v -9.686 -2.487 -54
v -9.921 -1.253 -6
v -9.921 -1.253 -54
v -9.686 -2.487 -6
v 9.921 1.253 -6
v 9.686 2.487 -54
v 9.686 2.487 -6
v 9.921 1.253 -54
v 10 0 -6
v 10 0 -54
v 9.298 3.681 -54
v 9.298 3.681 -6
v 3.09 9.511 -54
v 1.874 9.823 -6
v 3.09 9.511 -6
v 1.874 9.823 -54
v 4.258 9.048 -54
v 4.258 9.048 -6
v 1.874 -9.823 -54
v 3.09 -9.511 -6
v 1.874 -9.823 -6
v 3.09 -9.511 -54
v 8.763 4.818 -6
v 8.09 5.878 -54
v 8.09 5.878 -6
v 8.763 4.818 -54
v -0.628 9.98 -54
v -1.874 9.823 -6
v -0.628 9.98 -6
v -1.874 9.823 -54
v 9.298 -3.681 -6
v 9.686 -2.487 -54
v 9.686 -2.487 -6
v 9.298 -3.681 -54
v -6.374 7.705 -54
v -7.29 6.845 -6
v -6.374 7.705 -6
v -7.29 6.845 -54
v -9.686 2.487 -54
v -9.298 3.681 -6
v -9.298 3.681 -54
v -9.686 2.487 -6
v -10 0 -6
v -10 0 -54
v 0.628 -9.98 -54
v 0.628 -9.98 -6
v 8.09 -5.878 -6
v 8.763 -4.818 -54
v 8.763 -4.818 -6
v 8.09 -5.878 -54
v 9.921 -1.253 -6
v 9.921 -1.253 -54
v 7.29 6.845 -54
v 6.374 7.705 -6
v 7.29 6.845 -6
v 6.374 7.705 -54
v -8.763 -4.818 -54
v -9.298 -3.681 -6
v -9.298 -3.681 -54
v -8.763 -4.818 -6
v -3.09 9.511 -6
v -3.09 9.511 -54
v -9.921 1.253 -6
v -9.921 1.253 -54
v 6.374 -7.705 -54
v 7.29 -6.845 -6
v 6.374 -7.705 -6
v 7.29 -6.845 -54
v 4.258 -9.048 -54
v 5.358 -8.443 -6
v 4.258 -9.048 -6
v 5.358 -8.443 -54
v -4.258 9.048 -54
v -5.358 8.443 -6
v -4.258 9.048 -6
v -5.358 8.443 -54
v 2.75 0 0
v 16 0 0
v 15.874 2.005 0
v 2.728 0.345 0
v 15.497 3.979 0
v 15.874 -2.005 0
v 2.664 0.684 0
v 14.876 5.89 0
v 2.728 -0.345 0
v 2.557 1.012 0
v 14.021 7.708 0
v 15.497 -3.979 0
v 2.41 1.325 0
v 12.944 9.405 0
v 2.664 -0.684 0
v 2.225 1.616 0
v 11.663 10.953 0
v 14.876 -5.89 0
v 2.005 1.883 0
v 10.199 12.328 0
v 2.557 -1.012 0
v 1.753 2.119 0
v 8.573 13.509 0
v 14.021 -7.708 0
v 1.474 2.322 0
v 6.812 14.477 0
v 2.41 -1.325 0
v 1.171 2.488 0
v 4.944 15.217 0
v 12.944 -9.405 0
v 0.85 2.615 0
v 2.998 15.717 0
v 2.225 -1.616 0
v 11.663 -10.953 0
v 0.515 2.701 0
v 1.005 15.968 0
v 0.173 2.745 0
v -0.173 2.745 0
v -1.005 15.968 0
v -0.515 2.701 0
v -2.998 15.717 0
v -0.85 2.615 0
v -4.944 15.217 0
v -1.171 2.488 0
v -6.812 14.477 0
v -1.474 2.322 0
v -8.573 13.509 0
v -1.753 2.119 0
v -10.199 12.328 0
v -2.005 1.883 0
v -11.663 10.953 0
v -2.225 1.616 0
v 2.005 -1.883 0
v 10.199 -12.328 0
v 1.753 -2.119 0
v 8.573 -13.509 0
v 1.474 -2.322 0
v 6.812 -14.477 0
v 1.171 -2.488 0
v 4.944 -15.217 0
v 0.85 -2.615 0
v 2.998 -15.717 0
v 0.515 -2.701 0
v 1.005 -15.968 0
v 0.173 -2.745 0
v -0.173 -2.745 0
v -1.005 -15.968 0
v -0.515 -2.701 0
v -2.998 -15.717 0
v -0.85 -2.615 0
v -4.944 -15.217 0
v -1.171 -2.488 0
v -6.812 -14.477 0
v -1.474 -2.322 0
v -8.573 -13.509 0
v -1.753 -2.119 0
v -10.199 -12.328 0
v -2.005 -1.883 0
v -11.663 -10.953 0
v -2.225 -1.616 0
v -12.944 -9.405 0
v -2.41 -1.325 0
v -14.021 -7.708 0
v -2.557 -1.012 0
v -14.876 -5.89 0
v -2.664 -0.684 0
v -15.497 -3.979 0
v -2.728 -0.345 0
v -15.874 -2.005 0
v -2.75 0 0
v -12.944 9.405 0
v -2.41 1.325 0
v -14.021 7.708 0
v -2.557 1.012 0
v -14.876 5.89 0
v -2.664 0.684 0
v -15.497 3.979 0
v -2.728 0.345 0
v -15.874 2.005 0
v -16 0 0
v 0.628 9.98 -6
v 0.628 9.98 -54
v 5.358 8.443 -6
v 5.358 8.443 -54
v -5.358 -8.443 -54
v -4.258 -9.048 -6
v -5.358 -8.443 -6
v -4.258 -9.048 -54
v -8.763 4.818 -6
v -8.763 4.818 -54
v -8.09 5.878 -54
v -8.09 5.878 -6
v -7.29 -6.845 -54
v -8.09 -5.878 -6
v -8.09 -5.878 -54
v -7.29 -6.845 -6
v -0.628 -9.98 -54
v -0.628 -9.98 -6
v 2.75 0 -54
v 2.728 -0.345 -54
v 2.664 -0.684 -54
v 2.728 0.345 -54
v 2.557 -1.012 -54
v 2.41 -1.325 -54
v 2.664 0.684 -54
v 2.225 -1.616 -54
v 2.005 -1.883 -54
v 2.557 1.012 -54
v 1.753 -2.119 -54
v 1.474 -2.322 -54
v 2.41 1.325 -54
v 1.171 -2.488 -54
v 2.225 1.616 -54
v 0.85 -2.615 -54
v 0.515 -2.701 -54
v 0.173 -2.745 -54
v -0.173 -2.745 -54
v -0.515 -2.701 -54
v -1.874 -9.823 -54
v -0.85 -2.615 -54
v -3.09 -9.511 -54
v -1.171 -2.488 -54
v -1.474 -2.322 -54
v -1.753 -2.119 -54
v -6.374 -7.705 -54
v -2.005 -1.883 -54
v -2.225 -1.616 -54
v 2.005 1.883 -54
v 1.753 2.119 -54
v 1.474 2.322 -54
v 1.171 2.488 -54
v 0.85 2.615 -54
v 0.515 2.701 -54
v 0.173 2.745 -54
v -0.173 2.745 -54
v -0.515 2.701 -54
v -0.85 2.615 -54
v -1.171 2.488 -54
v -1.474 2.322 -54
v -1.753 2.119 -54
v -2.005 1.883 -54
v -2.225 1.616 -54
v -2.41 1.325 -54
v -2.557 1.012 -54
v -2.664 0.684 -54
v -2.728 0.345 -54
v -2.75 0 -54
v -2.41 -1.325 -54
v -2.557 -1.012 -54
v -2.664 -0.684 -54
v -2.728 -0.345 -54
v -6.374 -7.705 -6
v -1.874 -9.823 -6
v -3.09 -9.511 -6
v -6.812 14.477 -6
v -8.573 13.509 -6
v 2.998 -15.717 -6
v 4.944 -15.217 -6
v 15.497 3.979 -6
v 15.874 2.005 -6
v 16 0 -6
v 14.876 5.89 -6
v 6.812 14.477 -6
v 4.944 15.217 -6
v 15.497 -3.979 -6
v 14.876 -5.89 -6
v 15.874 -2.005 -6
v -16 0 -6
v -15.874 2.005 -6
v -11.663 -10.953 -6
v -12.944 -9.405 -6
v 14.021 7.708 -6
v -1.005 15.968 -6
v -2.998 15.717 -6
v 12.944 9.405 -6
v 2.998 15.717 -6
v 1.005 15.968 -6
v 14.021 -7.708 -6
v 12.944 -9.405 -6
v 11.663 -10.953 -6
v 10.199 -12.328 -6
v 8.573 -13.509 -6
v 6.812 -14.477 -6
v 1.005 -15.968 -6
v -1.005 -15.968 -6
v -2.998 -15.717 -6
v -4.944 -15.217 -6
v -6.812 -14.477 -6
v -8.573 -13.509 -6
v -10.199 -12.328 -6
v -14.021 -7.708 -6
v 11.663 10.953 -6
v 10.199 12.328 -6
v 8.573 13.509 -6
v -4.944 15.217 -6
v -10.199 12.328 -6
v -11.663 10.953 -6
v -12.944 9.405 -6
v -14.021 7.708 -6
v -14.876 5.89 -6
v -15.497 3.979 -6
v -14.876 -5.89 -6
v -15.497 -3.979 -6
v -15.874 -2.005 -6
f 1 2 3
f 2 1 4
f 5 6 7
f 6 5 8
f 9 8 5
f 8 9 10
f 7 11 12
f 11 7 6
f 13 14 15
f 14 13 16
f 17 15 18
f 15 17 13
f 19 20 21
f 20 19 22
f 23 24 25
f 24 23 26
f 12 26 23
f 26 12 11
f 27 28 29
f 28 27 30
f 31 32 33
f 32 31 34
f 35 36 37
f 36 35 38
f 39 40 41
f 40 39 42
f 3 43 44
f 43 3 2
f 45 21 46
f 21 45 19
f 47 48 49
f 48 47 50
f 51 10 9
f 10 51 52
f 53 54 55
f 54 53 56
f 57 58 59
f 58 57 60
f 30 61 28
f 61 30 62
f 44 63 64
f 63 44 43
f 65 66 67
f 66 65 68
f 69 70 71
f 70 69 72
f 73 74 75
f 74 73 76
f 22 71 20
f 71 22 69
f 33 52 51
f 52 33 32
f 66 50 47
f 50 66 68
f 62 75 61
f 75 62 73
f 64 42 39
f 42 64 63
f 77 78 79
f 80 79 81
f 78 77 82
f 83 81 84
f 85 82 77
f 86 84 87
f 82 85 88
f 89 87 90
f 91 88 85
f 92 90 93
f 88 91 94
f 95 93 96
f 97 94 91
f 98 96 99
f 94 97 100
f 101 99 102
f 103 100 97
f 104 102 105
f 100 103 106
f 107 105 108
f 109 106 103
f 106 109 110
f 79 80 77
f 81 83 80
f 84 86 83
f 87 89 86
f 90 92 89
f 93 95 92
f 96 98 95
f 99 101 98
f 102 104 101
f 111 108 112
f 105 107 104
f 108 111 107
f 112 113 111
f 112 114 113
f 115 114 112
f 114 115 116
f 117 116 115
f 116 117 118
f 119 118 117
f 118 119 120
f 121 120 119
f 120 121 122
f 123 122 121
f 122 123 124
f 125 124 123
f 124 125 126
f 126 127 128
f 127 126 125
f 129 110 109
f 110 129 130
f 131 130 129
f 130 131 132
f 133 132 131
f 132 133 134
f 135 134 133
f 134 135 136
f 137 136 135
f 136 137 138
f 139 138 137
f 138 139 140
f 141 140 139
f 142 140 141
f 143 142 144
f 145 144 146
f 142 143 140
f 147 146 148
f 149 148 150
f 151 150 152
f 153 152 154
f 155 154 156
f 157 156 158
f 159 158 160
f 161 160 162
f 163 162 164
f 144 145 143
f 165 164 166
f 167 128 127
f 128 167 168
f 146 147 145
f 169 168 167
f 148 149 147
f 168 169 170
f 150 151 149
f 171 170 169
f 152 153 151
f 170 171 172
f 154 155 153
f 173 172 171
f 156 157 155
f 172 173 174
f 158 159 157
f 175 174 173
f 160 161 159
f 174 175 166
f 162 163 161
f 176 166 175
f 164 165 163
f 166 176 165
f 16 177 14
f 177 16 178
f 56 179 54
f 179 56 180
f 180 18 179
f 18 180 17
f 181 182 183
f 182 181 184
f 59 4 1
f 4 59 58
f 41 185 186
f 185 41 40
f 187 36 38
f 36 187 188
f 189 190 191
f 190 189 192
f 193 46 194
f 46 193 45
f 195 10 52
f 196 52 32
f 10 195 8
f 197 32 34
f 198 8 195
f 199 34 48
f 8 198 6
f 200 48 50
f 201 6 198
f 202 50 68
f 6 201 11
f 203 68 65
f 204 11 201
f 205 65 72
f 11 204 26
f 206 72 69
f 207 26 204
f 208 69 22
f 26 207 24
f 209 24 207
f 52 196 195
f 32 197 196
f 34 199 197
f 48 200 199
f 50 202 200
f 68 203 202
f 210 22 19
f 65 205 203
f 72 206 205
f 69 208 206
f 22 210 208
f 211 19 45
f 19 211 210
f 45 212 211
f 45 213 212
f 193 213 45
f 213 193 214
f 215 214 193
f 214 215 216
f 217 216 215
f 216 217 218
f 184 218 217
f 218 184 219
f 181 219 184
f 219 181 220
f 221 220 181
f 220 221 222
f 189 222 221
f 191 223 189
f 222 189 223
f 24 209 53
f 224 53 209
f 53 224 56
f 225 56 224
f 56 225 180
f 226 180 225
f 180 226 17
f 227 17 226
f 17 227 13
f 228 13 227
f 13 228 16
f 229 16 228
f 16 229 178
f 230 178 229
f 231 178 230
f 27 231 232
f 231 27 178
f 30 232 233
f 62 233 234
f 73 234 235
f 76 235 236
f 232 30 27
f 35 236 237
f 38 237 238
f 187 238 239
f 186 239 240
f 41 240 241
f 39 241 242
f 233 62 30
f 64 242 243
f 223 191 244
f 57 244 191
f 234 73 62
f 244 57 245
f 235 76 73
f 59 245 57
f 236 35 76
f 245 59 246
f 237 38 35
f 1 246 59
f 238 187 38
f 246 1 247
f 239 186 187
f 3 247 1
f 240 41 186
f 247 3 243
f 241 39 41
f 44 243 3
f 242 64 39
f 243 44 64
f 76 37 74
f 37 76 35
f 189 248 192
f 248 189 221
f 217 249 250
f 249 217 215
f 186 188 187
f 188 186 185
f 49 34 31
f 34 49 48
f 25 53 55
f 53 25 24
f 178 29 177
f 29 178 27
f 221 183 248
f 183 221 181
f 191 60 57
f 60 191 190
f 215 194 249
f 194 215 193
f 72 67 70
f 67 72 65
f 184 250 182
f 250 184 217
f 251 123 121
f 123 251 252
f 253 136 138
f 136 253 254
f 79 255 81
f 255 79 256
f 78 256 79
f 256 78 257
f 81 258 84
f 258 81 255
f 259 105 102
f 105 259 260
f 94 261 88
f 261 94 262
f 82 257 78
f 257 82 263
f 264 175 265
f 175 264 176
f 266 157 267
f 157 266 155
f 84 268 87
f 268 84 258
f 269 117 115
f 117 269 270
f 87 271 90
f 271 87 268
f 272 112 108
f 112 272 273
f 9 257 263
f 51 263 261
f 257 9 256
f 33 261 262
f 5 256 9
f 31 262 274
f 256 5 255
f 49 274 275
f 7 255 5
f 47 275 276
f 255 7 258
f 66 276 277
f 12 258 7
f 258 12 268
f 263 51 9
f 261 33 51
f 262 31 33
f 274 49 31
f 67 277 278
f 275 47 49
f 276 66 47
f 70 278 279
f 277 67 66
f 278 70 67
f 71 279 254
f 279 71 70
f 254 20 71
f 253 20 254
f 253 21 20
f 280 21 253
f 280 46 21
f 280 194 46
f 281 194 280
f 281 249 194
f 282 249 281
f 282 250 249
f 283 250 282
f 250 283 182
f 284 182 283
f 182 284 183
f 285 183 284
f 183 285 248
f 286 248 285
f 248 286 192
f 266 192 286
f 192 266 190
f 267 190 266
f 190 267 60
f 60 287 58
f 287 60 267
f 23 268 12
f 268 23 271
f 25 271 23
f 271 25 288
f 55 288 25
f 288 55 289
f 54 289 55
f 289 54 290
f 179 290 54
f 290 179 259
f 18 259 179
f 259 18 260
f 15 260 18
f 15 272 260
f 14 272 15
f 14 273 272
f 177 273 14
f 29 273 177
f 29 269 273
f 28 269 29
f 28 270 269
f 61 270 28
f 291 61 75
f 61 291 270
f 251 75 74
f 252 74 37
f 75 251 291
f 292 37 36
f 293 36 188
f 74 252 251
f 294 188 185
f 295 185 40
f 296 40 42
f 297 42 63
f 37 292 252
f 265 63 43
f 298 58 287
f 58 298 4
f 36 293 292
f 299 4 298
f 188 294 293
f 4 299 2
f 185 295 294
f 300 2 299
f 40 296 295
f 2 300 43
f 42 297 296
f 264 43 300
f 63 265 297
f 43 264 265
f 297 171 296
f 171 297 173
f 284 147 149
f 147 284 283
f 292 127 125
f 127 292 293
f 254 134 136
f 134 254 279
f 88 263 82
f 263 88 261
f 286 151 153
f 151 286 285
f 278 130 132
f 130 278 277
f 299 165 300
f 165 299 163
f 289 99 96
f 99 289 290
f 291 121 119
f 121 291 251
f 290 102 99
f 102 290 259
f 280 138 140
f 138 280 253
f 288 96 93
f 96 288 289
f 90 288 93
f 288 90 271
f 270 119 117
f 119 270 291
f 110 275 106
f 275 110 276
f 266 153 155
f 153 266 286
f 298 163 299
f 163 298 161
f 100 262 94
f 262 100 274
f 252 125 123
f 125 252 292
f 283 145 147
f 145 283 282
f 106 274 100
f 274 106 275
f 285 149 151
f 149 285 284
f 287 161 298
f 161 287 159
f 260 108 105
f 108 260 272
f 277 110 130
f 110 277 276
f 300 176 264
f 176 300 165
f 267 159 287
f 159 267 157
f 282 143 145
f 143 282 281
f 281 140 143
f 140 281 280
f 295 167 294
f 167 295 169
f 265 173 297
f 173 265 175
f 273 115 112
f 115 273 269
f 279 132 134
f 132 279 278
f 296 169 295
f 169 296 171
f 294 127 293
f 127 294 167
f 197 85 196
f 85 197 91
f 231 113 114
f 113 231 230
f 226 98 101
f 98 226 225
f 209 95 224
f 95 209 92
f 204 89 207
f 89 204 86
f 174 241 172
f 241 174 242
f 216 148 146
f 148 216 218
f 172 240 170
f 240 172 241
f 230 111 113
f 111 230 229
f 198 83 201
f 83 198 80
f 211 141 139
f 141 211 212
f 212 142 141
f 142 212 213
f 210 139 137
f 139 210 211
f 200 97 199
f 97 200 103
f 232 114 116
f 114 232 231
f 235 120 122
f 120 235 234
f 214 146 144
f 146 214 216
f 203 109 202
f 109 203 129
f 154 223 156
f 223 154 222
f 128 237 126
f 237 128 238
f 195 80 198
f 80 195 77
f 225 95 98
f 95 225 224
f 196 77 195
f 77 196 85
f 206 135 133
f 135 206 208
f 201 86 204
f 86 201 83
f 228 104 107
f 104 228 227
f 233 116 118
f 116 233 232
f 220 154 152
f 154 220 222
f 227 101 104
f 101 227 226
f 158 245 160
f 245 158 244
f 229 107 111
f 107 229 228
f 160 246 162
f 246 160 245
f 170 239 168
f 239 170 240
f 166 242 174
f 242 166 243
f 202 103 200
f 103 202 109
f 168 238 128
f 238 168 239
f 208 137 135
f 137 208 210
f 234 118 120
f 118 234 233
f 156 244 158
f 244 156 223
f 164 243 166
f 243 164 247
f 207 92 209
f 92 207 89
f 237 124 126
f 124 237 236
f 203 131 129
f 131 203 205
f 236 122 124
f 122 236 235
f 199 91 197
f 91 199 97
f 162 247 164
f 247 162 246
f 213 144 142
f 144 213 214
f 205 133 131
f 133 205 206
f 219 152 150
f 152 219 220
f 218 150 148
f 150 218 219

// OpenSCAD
$fn = 50;


difference() {
	union() {
		translate(v = [0, 0, -54.0000000000]) {
			cylinder(h = 54, r = 10.0000000000);
		}
		translate(v = [0, 0, -6.0000000000]) {
			cylinder(h = 6, r = 16.0000000000);
		}
	}
	union() {
		#translate(v = [0, 0, -54]) {
			cylinder(h = 54, r = 2.7500000000);
		}
	}
}
